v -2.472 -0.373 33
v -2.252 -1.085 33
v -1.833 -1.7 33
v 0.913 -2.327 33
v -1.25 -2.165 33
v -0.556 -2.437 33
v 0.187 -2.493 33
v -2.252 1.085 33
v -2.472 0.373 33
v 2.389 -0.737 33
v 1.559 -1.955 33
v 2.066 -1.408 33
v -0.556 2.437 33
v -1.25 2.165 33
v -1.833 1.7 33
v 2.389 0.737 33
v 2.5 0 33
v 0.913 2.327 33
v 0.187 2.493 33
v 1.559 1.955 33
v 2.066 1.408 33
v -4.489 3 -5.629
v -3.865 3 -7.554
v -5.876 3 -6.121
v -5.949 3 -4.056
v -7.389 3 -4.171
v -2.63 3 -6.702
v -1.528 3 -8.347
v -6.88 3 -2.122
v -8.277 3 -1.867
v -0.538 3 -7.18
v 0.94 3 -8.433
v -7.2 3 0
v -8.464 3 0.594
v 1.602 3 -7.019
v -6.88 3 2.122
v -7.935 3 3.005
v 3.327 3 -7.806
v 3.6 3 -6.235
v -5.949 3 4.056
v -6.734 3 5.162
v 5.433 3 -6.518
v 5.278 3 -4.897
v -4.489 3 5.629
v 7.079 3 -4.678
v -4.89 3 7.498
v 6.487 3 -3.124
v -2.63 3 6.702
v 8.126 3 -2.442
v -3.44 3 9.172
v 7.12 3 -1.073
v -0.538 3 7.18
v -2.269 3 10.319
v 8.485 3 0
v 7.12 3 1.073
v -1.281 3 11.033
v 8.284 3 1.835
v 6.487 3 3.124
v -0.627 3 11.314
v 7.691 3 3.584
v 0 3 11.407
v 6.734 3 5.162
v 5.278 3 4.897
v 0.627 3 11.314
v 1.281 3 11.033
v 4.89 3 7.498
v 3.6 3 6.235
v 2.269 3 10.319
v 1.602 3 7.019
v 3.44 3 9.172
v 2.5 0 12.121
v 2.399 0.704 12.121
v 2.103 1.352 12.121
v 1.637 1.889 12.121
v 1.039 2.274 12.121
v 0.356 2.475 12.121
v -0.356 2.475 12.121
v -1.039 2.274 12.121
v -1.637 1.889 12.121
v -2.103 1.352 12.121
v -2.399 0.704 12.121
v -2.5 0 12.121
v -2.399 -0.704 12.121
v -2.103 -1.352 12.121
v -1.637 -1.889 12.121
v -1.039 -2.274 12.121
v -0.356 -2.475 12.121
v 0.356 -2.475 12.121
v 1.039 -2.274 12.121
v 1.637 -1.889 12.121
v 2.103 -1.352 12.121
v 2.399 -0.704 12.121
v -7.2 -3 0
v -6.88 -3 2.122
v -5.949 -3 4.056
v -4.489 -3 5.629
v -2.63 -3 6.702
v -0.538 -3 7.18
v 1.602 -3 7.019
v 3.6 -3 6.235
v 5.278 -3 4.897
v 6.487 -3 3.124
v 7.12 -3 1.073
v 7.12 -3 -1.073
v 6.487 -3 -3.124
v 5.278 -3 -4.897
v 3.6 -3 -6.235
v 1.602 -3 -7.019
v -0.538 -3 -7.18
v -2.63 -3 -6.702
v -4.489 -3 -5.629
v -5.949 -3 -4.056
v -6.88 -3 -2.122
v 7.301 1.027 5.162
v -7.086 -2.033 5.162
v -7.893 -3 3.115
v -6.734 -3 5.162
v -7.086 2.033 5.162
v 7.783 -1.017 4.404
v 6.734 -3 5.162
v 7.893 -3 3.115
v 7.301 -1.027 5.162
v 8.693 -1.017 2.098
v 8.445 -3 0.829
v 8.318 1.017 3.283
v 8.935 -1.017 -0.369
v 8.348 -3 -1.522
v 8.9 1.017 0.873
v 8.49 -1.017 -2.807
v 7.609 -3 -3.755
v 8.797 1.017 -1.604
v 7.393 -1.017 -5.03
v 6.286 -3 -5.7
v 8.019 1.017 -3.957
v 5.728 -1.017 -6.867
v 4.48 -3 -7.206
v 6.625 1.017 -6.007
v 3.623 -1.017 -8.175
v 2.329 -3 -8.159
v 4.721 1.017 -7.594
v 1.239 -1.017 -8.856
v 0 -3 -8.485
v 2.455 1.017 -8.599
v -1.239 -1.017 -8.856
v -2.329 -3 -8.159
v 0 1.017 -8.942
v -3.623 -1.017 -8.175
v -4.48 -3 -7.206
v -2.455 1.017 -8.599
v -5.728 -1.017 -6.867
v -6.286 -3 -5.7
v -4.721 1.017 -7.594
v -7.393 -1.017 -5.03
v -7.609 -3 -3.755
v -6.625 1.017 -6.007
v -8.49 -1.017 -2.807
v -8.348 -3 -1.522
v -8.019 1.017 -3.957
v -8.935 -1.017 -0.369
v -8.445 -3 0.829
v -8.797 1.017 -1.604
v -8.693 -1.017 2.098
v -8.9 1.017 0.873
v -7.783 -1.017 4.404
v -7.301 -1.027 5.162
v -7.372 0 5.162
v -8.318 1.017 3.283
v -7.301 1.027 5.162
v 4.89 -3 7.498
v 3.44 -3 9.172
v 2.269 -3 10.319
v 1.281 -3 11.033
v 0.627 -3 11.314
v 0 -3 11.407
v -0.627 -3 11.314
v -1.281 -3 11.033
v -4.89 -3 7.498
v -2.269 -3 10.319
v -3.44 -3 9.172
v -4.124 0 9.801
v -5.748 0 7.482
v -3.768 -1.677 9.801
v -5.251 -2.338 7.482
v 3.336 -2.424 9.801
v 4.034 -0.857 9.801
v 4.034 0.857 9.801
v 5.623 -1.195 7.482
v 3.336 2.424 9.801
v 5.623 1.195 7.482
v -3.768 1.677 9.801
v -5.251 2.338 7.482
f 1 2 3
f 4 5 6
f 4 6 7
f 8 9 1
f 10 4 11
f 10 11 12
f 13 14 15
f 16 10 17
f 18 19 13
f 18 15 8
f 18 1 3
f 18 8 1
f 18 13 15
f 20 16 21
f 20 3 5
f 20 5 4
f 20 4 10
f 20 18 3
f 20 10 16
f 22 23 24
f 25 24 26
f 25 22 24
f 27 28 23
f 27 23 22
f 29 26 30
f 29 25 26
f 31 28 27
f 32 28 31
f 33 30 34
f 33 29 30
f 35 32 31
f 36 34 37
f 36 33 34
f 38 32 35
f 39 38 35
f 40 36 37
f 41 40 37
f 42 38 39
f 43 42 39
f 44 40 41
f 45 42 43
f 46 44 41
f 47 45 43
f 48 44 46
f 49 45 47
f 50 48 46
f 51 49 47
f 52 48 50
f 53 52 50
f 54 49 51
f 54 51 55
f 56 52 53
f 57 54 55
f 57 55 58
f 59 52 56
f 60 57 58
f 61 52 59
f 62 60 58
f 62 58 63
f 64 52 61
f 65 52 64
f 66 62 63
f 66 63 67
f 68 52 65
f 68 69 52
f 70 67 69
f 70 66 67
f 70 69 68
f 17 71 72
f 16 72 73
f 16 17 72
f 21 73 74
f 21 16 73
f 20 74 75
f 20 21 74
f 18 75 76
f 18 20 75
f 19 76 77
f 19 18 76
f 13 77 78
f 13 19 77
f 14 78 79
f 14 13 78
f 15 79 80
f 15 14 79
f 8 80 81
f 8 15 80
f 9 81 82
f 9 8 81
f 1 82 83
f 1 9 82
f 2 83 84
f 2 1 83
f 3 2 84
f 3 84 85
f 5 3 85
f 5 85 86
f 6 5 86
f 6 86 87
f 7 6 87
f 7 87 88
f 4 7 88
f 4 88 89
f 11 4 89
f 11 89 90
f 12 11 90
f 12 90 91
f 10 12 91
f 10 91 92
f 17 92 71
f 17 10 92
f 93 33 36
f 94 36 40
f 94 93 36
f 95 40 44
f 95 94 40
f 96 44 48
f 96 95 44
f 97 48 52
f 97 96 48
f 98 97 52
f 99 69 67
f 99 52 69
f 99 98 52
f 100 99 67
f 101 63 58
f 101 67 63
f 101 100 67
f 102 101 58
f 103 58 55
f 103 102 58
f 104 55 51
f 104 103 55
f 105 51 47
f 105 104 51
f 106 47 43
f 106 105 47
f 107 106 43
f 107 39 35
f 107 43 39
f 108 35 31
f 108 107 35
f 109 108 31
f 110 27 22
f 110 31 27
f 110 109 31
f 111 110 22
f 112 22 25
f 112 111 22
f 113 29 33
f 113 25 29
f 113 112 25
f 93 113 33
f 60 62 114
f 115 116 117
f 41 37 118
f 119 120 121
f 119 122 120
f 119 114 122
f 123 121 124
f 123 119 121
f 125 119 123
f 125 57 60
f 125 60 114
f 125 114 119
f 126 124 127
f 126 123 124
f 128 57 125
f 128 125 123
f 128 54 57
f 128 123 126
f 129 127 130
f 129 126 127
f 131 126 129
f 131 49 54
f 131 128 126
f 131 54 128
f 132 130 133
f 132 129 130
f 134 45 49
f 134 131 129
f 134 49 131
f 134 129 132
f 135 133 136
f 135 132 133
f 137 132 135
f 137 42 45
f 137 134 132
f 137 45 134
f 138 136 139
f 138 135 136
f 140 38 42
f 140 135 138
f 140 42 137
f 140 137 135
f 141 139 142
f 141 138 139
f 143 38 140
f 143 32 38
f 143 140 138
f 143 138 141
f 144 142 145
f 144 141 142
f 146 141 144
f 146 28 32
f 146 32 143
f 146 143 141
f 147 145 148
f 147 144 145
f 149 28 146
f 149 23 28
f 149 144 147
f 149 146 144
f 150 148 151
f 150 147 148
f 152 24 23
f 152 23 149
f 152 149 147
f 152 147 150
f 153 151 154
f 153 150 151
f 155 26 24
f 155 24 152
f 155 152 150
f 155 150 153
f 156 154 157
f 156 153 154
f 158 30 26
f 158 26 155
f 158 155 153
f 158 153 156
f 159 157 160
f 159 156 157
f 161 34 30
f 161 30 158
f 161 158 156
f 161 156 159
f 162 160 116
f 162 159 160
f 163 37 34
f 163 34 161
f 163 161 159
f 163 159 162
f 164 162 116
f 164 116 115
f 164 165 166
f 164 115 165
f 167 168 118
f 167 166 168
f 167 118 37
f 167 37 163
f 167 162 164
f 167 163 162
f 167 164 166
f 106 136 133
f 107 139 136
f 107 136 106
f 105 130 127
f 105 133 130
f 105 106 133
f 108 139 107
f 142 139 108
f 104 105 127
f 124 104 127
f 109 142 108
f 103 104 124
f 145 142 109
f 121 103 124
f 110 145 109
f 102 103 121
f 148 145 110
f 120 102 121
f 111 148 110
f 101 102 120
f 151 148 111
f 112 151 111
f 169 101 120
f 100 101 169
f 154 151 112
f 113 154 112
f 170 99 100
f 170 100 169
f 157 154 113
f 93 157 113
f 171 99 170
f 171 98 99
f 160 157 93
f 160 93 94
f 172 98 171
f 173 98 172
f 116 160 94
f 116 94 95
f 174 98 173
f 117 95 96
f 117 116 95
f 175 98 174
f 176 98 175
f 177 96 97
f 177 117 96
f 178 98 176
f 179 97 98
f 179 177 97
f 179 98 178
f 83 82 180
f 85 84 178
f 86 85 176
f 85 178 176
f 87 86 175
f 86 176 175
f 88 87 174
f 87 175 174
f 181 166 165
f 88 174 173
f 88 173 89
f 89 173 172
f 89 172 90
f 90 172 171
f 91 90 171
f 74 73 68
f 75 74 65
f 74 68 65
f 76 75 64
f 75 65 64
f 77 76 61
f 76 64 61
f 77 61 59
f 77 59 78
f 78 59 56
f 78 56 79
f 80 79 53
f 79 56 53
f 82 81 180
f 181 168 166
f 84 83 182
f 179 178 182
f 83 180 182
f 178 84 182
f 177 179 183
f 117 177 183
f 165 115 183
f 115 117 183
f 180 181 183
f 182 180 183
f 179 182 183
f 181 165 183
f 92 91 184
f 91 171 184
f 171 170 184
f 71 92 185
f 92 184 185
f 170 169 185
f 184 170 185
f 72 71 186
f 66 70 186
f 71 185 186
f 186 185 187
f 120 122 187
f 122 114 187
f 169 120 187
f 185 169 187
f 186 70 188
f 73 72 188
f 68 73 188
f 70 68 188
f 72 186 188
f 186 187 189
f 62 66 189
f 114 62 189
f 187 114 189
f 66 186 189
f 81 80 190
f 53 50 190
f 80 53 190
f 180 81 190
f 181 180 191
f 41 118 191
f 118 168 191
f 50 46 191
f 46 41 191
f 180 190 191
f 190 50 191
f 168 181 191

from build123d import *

# Parameters (mm, degrees)
BOSS_EXTRUDE1_REACH     = 44
SKETCH4_R               = 2.5
CUT_EXTRUDE1_DEPTH      = 10
CUT_EXTRUDE1_DEPTH_BACK = 10


with BuildPart() as part:
    # Sketch1 → Revolve1 (revolve)
    with BuildSketch(Plane.XY):
        with BuildLine():
            Line((-8.485281374, 3), (-7.2, 3))
            Line((-7.2, 3), (-7.2, -3))
            Line((-7.2, -3), (-8.485281374, -3))
            ThreePointArc((-8.485281374, -3), (-9, 0), (-8.485281374, 3))
        make_face()
    revolve(axis=Axis((0, -4.387716131, 0), (0, 1, 0)))

    # Sketch4 → Boss-Extrude1 (add, up to next)
    with BuildSketch(Plane.XY.offset(33), mode=Mode.PRIVATE) as boss_extrude1_sk1:
        Circle(SKETCH4_R)
    boss_extrude1_tool1 = extrude(boss_extrude1_sk1.sketch, amount=-BOSS_EXTRUDE1_REACH, mode=Mode.PRIVATE) - part.part
    add(boss_extrude1_tool1.solids().sort_by_distance((0, 0, 33))[0])

    # Sketch5 → Revolve2 (revolve)
    with BuildSketch(Plane(origin=(0, 0, 0), x_dir=(1, 0, 0), z_dir=(0, 1, 0))):
        with BuildLine():
            Line((0, -7.8), (0, -15.691021161))
            Line((0, -15.691021161), (-7.372368399, -5.162187927))
            ThreePointArc((-7.372368399, -5.162187927), (-8.583452557, -2.706352196), (-9, 0))
            Line((-9, 0), (-7.8, 0))
            ThreePointArc((-7.8, 0), (-5.515432893, -5.515432893), (0, -7.8))
        make_face()
    revolve(axis=Axis((0, 0, 0), (0, 0, 1)))

    # Sketch6 → Cut-Extrude1 (cut, two sides)
    with BuildSketch(Plane.ZY) as cut_extrude1_sk:
        Polygon((0, 3), (11.40657714, 3), (12.120651144, 2.5), (12, 3), (12, 13), (0, 13), align=None)
        Polygon((0, -3), (11.40657714, -3), (12.120651144, -2.5), (12, -3), (12, -13), (0, -13), align=None)
    extrude(amount=CUT_EXTRUDE1_DEPTH, mode=Mode.SUBTRACT)
    extrude(cut_extrude1_sk.sketch, amount=-CUT_EXTRUDE1_DEPTH_BACK, mode=Mode.SUBTRACT)


solid = part.part
